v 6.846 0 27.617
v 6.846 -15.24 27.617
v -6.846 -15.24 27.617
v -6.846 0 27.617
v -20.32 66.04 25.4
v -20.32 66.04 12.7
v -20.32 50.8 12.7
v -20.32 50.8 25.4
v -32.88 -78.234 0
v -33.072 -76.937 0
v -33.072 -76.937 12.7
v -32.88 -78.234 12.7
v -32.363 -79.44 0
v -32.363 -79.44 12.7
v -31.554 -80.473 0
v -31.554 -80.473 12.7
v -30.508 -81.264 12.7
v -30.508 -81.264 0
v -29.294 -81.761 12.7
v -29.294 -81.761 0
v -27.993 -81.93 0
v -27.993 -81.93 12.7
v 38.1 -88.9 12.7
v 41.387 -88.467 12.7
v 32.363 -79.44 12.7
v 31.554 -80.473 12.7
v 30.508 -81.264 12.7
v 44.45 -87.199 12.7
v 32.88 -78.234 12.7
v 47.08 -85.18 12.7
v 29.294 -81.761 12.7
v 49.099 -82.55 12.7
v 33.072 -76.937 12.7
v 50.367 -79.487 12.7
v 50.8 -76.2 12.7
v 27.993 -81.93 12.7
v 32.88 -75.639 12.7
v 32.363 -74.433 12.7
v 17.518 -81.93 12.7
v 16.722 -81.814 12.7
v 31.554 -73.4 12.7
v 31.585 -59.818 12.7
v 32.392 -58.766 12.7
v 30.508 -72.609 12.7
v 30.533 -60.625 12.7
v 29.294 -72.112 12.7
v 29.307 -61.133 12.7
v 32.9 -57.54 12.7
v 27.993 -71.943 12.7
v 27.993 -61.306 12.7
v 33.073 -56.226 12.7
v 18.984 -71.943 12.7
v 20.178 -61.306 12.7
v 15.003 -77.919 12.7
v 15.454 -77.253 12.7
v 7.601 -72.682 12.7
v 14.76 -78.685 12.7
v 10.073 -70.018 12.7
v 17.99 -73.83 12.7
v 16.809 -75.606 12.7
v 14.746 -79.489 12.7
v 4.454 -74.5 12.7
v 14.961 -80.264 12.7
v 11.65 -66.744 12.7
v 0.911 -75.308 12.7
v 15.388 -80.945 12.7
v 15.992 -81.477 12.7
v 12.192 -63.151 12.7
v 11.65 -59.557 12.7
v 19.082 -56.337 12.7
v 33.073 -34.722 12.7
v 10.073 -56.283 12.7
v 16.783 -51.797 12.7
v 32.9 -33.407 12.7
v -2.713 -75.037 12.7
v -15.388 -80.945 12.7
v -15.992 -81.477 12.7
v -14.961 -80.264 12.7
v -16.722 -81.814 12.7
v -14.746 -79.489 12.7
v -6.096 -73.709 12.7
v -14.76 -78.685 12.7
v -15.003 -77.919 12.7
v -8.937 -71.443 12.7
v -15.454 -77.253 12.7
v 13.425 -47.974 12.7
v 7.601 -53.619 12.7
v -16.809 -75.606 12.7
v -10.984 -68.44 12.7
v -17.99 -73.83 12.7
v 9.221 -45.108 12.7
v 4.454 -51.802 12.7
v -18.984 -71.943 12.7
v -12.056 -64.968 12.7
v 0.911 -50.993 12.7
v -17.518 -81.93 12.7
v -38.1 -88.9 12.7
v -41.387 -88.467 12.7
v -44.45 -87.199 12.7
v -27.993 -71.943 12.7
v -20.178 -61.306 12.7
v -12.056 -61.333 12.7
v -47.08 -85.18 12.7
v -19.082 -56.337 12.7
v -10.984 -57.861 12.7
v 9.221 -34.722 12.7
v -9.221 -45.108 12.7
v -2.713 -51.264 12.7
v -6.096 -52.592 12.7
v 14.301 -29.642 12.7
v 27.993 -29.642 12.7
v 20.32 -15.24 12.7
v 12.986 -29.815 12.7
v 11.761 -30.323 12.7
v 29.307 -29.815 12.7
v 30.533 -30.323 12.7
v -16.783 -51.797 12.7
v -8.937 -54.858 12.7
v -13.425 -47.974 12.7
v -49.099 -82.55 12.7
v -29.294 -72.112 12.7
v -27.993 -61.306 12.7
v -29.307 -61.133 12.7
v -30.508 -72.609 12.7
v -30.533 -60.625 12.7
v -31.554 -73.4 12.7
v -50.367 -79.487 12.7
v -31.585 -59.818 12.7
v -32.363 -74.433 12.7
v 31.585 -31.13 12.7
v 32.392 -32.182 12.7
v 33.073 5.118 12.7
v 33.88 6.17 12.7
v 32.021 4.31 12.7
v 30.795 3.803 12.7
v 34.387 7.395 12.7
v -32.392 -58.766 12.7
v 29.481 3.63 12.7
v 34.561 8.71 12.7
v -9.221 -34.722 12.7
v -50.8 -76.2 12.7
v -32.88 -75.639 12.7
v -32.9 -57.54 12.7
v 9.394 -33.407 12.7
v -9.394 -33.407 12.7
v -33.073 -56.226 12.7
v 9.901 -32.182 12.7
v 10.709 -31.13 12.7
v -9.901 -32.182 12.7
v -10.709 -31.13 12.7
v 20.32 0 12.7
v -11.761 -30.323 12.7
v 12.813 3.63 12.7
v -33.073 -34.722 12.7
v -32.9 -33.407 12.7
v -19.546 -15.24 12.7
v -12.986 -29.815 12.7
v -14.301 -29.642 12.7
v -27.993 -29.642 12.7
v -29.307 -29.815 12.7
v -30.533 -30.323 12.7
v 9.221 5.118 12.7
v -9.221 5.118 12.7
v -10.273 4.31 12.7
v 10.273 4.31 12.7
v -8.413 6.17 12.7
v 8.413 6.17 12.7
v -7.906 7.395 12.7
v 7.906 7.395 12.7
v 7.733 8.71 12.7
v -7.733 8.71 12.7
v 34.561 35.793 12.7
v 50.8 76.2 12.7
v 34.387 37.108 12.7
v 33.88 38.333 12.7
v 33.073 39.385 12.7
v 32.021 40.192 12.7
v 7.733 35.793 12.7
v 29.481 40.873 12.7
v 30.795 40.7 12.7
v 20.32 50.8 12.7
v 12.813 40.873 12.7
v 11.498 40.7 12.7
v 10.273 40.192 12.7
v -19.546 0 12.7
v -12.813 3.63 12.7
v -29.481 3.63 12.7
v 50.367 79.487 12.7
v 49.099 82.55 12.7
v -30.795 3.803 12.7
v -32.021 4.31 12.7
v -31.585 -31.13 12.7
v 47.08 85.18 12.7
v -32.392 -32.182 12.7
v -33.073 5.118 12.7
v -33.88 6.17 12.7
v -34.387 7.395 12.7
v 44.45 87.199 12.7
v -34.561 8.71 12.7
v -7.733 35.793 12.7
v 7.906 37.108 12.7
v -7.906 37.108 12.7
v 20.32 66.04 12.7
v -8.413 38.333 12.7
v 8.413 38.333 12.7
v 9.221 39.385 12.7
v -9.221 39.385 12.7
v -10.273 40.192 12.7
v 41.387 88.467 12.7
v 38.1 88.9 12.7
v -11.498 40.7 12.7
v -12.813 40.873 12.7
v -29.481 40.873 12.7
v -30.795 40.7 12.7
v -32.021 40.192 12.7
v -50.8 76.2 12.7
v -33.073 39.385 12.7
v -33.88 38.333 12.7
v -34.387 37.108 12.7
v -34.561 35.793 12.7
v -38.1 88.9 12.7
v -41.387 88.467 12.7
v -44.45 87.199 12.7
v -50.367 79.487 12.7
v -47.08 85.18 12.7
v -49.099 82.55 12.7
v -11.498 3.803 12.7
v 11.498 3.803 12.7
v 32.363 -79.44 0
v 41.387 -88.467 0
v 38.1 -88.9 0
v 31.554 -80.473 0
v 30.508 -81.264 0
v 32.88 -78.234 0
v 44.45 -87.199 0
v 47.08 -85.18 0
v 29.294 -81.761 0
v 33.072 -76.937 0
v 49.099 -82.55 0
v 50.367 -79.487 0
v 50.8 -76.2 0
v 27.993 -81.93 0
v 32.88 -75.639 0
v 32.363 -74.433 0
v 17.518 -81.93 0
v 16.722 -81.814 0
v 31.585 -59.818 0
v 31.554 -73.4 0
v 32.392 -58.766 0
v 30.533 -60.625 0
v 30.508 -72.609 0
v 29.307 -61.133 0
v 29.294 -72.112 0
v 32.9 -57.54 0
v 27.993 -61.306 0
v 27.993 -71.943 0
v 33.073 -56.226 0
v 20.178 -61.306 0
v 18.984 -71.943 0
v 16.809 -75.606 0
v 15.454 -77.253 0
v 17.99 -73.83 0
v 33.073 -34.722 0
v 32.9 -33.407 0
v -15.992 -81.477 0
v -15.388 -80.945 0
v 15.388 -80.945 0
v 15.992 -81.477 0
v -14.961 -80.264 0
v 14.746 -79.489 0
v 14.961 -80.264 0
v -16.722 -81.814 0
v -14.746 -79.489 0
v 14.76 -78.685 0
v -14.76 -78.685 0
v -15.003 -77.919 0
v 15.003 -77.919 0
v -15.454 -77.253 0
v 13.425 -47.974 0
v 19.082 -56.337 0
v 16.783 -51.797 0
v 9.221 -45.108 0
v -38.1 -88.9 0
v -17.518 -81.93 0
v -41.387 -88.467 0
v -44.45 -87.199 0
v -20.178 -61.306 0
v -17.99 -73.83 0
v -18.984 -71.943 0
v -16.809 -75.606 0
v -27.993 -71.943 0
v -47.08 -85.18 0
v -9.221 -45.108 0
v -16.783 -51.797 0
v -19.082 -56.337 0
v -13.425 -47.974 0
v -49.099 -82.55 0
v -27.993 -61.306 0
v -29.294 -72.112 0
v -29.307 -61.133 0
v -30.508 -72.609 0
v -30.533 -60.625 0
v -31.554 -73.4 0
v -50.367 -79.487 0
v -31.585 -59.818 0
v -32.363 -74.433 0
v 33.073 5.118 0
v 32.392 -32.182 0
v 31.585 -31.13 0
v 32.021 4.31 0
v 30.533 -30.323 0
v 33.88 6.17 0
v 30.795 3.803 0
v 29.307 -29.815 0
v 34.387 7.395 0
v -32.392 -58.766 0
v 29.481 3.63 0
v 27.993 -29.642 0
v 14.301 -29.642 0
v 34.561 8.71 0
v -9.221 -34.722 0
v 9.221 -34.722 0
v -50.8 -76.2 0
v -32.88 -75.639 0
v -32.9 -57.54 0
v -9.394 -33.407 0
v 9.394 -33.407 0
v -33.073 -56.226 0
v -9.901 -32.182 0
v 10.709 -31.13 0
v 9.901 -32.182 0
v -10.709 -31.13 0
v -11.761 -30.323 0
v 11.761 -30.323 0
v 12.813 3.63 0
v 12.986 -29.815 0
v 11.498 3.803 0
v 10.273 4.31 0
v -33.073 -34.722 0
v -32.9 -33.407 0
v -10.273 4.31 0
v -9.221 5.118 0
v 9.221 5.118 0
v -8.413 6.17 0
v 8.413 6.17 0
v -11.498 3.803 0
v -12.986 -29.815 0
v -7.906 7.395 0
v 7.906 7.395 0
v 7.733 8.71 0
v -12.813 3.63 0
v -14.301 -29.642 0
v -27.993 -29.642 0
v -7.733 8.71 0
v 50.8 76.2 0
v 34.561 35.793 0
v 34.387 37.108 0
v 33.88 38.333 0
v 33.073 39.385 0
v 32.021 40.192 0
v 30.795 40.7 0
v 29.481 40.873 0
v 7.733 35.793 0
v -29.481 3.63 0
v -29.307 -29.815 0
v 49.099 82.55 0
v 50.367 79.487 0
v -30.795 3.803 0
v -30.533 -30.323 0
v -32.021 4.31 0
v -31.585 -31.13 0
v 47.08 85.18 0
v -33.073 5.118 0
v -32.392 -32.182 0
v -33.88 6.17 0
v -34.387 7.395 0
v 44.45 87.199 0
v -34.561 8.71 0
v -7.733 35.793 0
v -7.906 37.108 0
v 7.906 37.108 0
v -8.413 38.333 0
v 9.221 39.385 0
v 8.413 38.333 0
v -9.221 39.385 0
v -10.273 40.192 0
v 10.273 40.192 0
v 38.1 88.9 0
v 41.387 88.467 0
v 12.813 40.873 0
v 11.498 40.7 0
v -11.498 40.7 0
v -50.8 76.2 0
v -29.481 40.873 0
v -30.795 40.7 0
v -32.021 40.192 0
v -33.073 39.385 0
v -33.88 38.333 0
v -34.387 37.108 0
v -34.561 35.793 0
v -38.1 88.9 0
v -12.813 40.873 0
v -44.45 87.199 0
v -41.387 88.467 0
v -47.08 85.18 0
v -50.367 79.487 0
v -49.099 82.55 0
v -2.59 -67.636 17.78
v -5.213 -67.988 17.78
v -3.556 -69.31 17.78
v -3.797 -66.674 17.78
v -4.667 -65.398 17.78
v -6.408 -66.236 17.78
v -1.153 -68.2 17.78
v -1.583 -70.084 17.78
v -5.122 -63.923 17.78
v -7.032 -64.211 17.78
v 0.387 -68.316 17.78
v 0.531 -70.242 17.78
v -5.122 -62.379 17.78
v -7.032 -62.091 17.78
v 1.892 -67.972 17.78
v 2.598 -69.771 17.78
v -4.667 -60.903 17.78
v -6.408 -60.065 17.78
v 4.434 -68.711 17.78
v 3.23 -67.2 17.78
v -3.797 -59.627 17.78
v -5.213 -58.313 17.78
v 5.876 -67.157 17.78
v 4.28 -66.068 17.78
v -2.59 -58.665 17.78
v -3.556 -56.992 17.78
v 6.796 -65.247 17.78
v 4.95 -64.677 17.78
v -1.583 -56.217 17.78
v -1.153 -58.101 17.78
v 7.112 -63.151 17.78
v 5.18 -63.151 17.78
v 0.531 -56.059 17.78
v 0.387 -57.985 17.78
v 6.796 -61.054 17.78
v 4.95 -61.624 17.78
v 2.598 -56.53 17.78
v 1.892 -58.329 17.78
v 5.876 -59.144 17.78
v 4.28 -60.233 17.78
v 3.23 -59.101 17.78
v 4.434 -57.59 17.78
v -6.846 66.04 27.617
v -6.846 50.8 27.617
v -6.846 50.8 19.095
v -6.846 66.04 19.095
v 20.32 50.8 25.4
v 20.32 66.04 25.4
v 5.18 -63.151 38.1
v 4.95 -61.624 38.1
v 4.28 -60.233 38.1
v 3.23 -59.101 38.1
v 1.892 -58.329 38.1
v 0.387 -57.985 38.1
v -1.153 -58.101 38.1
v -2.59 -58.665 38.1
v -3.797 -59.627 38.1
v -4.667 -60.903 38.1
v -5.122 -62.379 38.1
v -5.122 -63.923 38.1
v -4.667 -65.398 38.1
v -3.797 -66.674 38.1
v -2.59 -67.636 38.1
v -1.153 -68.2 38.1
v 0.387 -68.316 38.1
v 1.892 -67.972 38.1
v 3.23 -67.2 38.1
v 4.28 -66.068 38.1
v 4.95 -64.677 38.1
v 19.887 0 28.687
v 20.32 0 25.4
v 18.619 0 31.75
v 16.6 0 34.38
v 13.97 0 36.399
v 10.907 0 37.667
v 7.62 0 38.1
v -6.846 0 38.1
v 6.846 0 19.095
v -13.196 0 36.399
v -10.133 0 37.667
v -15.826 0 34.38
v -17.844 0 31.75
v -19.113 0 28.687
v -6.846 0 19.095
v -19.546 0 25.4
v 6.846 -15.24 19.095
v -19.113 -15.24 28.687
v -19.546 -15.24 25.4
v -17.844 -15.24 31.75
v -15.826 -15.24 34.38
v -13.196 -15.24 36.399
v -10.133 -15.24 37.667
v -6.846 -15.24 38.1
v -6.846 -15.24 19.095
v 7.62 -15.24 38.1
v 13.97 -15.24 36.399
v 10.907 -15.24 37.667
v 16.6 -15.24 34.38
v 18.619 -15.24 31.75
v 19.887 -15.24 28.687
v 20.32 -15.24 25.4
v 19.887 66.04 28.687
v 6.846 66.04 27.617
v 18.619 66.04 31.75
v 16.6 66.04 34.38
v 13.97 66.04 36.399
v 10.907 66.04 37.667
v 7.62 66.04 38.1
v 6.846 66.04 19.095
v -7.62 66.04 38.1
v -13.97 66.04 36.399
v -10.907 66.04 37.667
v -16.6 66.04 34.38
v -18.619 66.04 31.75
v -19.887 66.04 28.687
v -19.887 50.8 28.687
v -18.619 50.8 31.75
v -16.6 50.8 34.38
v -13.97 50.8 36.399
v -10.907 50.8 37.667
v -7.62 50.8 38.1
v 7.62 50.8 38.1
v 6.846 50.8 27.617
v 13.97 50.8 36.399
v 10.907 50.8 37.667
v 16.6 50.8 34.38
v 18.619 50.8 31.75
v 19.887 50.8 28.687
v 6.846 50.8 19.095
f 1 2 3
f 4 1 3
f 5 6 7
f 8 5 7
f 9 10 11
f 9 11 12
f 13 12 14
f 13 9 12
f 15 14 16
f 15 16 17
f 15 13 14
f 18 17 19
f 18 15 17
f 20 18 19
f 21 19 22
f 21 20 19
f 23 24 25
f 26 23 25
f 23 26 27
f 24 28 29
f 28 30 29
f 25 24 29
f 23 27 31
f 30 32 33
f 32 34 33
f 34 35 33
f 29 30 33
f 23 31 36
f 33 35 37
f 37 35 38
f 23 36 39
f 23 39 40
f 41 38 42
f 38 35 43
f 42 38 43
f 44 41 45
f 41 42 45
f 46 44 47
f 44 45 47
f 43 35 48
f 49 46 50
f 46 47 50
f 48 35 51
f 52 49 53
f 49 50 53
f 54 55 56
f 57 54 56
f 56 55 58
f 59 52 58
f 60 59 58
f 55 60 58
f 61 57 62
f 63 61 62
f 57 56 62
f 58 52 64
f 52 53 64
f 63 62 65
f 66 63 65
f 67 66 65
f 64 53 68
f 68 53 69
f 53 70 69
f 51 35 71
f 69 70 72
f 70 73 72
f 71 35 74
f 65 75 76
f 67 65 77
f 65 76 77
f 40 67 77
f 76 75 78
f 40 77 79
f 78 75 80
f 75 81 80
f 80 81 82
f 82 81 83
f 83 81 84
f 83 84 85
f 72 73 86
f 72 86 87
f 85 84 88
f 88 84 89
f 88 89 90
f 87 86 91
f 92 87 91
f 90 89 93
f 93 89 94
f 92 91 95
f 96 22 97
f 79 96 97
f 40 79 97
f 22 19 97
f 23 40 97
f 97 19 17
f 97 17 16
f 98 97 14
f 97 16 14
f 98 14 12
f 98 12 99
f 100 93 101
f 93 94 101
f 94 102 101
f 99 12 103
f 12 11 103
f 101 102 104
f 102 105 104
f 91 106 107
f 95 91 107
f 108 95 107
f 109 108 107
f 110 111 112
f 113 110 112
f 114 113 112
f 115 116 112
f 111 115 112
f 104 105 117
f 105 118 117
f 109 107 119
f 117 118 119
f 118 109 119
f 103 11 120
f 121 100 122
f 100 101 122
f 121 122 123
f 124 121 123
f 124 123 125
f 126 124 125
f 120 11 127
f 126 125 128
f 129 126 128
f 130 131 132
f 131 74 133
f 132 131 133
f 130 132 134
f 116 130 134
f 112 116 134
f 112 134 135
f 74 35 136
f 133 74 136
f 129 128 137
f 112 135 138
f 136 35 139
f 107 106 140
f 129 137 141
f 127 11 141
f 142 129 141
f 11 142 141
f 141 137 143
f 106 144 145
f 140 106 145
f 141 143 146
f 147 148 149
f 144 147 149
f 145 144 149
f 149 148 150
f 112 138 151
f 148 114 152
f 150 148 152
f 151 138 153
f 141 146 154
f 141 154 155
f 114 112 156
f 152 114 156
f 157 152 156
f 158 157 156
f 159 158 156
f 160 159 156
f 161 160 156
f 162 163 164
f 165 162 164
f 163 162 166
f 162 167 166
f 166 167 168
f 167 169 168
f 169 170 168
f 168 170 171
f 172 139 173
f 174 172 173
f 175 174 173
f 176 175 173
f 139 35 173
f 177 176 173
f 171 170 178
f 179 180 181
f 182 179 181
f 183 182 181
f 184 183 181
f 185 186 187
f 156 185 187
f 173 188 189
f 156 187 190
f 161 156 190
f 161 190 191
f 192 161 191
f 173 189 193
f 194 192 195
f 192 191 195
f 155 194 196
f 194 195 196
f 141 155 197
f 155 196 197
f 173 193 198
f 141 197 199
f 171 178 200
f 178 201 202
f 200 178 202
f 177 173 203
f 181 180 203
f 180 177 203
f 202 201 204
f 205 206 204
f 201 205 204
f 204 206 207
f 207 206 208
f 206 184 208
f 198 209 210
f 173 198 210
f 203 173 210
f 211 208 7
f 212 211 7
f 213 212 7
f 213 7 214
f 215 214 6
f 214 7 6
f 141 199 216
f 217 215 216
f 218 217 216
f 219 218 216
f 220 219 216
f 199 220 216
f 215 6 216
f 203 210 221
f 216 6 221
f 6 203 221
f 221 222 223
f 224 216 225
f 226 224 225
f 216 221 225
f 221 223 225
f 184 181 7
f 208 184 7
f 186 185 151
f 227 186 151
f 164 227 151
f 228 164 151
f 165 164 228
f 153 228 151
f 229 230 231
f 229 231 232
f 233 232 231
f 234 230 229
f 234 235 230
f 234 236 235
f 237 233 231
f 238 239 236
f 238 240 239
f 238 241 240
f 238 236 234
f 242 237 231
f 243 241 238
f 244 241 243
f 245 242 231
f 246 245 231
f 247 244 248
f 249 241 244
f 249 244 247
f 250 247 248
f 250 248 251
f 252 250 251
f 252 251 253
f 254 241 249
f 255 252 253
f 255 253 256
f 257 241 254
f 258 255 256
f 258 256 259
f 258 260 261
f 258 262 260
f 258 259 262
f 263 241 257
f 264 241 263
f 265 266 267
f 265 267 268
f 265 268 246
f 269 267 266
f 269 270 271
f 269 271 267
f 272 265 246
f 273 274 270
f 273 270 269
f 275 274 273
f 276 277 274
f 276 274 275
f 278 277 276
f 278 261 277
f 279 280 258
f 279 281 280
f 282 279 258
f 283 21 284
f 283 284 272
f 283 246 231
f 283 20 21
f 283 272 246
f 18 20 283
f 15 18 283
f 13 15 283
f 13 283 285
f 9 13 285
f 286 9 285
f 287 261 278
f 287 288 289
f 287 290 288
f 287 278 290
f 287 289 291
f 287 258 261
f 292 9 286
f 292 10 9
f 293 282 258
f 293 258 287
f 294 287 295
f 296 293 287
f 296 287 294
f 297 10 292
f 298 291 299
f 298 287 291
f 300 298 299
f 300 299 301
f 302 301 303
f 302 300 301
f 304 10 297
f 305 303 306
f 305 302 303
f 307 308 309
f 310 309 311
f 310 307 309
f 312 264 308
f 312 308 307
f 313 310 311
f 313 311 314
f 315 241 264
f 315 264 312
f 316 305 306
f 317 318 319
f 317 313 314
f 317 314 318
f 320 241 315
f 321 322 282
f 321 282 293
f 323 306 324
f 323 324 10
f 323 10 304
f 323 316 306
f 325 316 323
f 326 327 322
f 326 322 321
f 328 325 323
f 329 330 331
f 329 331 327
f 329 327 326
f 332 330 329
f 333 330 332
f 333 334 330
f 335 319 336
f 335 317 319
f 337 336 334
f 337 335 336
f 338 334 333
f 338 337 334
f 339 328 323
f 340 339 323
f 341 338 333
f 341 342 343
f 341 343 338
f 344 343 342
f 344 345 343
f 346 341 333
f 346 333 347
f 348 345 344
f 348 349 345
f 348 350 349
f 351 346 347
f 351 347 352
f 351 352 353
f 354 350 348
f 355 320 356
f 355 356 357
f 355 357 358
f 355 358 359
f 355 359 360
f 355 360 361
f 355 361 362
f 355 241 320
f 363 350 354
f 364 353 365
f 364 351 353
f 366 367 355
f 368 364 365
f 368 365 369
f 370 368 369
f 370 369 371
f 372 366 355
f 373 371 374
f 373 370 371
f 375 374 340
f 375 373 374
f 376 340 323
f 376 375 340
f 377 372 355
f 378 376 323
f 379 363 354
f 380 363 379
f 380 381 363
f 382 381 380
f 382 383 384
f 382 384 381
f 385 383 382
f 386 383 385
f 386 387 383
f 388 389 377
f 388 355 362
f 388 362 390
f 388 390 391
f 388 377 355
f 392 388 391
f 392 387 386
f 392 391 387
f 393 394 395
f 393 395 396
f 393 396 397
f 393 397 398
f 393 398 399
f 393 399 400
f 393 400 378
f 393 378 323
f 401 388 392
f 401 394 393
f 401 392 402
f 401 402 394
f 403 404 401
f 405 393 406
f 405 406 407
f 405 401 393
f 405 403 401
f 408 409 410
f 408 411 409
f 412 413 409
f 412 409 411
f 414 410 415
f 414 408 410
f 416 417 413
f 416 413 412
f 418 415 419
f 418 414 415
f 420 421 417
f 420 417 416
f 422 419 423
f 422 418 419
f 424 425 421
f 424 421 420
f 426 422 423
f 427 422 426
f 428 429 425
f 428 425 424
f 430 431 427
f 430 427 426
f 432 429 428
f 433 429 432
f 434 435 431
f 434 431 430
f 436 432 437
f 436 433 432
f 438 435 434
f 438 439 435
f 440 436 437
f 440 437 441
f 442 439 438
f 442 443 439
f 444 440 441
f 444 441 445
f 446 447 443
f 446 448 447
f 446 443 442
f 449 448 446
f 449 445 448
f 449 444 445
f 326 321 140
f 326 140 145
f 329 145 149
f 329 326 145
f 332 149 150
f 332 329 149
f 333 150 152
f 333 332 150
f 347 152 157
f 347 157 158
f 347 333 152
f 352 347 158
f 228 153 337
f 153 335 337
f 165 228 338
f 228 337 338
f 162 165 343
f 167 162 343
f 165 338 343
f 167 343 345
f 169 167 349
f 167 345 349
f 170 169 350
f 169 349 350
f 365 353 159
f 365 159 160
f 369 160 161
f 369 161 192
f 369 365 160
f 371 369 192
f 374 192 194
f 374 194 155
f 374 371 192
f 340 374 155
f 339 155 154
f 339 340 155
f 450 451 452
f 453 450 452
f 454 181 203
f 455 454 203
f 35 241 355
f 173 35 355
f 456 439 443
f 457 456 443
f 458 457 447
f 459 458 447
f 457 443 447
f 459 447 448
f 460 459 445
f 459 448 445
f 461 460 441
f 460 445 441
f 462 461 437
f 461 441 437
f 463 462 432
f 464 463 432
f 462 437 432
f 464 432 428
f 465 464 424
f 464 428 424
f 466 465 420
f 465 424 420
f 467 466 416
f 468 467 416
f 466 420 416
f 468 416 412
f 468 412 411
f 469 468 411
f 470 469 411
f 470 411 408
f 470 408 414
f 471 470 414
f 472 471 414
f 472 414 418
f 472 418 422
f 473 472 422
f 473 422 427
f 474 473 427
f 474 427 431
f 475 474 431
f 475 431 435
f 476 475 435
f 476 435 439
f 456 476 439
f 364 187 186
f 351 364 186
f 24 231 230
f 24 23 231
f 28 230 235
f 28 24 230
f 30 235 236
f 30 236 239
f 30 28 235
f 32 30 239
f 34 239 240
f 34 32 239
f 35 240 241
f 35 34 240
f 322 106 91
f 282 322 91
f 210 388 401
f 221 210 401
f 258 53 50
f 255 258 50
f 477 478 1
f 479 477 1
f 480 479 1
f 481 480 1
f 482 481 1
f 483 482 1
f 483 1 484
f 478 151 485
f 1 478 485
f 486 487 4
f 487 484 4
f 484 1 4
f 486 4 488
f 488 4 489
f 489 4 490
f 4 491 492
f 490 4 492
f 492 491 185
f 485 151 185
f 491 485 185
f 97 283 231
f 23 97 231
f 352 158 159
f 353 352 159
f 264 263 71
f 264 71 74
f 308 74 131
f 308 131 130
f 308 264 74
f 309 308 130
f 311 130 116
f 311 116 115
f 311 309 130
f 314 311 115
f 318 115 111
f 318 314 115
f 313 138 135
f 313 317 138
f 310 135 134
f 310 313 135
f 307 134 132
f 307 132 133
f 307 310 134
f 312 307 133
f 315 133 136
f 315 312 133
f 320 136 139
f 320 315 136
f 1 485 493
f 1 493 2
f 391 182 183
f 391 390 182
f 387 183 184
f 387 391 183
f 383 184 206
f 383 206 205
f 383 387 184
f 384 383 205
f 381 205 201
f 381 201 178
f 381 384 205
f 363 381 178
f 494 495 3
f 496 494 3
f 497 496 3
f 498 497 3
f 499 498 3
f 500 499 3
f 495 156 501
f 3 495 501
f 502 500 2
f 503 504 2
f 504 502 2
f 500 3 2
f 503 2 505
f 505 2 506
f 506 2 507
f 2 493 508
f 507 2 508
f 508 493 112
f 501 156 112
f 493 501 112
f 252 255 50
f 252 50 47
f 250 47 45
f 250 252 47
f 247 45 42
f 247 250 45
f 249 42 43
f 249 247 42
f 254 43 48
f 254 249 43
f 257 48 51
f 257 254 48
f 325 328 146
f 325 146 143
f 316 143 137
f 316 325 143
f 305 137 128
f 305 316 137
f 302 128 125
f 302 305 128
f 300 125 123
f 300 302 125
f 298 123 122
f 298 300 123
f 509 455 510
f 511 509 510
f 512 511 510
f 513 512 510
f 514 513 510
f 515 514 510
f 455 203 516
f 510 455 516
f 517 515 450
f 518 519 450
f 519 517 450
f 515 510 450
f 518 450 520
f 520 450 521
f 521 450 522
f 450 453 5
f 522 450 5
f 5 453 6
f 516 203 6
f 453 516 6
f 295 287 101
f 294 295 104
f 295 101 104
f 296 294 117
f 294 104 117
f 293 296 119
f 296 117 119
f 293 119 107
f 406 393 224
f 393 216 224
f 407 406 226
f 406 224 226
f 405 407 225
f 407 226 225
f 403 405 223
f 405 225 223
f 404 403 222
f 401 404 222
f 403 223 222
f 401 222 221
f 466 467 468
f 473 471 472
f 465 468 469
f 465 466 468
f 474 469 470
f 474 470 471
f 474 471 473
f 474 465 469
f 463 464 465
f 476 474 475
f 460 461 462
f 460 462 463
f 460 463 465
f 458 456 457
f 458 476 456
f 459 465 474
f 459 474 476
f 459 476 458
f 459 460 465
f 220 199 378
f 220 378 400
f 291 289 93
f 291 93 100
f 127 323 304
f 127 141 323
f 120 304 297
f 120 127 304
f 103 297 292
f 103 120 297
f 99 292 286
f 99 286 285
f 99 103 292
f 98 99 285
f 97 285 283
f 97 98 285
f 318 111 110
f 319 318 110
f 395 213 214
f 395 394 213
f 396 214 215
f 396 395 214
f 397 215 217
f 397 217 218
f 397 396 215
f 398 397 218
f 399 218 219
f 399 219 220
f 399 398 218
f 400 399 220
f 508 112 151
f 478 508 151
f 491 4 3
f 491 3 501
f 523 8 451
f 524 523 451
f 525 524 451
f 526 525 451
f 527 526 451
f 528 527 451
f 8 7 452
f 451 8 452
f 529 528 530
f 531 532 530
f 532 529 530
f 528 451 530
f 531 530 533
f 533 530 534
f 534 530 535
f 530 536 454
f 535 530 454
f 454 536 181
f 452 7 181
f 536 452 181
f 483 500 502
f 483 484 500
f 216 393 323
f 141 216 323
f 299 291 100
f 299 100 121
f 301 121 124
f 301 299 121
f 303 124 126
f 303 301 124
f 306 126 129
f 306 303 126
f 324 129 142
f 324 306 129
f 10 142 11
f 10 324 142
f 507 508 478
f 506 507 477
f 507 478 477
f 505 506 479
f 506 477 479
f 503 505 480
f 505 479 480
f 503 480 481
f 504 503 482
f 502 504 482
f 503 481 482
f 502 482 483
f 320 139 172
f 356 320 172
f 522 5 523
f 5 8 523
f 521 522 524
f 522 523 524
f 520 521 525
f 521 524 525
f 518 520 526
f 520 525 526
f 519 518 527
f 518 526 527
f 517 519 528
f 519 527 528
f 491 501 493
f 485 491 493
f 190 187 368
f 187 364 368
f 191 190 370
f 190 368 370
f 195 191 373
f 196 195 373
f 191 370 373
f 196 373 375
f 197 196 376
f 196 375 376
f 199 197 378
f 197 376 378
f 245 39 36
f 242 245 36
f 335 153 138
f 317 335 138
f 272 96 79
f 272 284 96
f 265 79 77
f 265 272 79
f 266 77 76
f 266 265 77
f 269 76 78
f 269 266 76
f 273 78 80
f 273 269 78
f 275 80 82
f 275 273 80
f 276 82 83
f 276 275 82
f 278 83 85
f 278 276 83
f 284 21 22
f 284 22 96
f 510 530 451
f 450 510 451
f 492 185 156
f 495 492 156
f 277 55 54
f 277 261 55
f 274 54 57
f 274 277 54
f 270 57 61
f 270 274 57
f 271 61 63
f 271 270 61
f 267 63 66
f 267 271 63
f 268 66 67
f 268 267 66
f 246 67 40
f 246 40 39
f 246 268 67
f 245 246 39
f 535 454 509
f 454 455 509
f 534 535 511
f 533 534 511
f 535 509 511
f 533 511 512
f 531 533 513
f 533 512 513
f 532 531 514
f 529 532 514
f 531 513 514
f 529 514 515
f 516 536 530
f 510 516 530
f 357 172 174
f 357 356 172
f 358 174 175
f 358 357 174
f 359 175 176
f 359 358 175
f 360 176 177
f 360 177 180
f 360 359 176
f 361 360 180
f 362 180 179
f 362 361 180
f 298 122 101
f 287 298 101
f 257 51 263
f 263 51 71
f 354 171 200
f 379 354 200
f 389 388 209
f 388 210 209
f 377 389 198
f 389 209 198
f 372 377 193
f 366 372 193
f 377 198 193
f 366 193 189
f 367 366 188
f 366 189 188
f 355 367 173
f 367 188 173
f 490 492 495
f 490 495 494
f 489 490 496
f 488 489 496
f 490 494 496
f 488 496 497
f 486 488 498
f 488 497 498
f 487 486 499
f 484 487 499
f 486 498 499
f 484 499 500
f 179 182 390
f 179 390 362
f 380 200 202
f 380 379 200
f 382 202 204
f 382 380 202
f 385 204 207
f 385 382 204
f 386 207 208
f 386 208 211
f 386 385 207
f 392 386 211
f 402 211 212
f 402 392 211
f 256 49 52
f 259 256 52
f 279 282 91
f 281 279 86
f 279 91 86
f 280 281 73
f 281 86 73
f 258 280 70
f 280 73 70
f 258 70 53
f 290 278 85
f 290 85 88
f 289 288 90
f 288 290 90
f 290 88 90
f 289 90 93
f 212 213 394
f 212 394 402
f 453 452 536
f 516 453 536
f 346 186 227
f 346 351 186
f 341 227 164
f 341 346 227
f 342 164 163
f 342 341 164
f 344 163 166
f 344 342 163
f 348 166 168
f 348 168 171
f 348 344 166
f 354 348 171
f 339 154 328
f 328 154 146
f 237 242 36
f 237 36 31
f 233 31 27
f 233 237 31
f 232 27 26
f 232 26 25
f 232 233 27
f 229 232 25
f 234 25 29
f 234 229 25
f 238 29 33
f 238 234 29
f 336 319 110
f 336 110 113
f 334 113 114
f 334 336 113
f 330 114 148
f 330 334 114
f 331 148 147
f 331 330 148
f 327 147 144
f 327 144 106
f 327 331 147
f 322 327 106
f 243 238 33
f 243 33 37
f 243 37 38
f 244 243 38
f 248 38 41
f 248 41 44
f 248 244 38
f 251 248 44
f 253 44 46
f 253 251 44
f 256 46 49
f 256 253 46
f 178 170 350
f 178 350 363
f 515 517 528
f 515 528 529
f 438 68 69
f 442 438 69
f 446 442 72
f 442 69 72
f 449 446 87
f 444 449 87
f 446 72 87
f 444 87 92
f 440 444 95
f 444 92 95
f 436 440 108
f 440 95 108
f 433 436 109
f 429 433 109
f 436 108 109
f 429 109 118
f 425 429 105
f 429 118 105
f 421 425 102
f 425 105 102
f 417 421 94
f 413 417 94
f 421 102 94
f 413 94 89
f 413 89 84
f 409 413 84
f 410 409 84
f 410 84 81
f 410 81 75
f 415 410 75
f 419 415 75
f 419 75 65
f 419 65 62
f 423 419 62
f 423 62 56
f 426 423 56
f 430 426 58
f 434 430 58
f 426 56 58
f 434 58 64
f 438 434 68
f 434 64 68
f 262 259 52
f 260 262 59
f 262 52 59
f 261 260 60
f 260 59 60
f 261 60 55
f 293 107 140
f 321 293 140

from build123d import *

# Parameters (mm, degrees)
F1_DEPTH     = 12.7
F3_DEPTH     = 25.4
F4_R         = 12.7
F5_R         = 12.7
F6_R         = 12.7
F8_DEPTH     = 104.141
F9_W         = 26.8278098665
F9_H         = 37.2433126904
F10_DEPTH    = 12.701
F11_R        = 5.08
F12_R        = 12.1917967362
F12_R_2      = 5.1797647995
F13_DEPTH    = 5.08
F14_DEPTH    = 25.4
F15_SIZE     = 5.07999
F17_DEPTH    = 25.4
F18_R        = 5.08
F19_DEPTH    = 12.701
F21_DEPTH    = 12.701
F22_T1_DEPTH = 12.7
F23_R        = 2.794


# Not quite as in the source:
# - a fillet or chamfer that OpenCascade refuses, or shapes differently, is made with other operations: its cross-section is extruded or revolved along the edge and cut away or added
# - a fillet or chamfer is up to 0.001 mm smaller than in the source, because OpenCascade refuses the exact size
# - a feature names something its author has since deleted; it is built from what else it names


with BuildPart() as f1:
    # F0 (on Top) → F1 (new body)
    with BuildSketch(Plane.XY):
        Polygon((-50.8, 88.9), (-50.8, 0), (-50.8, -88.9), (0, -88.9), (50.8, -88.9), (50.8, 0), (50.8, 88.9), (0, 88.9), align=None)
    extrude(amount=F1_DEPTH)

    # F2 (on face) → F3 (join)
    with BuildSketch(Plane.XY.offset(12.7)):
        Polygon((20.32, 66.04), (0, 66.04), (-20.32, 66.04), (-20.32, 50.8), (0, 50.8), (20.32, 50.8), align=None)
        Polygon((0, 0), (-19.5459036618, 0), (-19.5459036618, -15.24), (0, -15.24), (20.32, -15.24), (20.32, 0), align=None)
    extrude(amount=F3_DEPTH)

    # F4
    f4_edges = [f1.edges().sort_by_distance(p)[0] for p in [
        (20.32, -7.62, 38.1),
        (-19.545904, -7.62, 38.1),
    ]]
    fillet(f4_edges, radius=F4_R)

    # F5
    f5_edges = [f1.edges().sort_by_distance(p)[0] for p in [
        (20.32, 58.42, 38.1),
        (-20.32, 58.42, 38.1),
    ]]
    fillet(f5_edges, radius=F5_R)

    # F6
    f6_edges = [f1.edges().sort_by_distance(p)[0] for p in [
        (50.8, 88.9, 6.35),
        (-50.8, 88.9, 6.35),
        (50.8, -88.9, 6.35),
        (-50.8, -88.9, 6.35),
    ]]
    fillet(f6_edges, radius=F6_R)

    # F7 (on face) → F8 (cut, through all)
    with BuildSketch(Plane.XZ.offset(15.24)):
        Polygon((6.8459036618, 27.6168659329), (0, 27.6168659329), (-6.8459036618, 27.6168659329), (-6.8459036618, 19.0950892866), (0, 19.0950892866), (6.8459036618, 19.0950892866), align=None)
    extrude(amount=-F8_DEPTH, mode=Mode.SUBTRACT)

    # F9 (on face) → F10 (cut, through all)
    with BuildSketch(Plane.XY.offset(12.7)):
        with Locations((-21.1466264445, 22.2513012122)):
            Rectangle(F9_W, F9_H)
        with Locations((21.1466264445, 22.2513012122)):
            Rectangle(F9_W, F9_H)
    extrude(amount=-F10_DEPTH, mode=Mode.SUBTRACT)

    # F11
    f11_edges = [f1.edges().sort_by_distance(p)[0] for p in [
        (-34.560531, 40.872958, 6.35),
        (-7.732722, 40.872958, 6.35),
        (-7.732722, 3.629645, 6.35),
        (-34.560531, 3.629645, 6.35),
        (34.560531, 3.629645, 6.35),
        (7.732722, 3.629645, 6.35),
        (7.732722, 40.872958, 6.35),
        (34.560531, 40.872958, 6.35),
    ]]
    fillet(f11_edges, radius=F11_R)

    # F12 (on face) → F13 (join)
    with BuildSketch(Plane.XY.offset(12.7)):
        with Locations((0, -63.150562346)):
            Circle(F12_R)
        with Locations((0, -63.150562346)):
            Circle(F12_R_2, mode=Mode.SUBTRACT)
    extrude(amount=F13_DEPTH)

    # F14 (add): a face of the model
    f14_faces = [f1.faces().sort_by_distance(p)[0] for p in [
        (0, -63.150562346, 12.7),
    ]]
    extrude(f14_faces, amount=F14_DEPTH)

    # F15 (size 5.08 in the source; OpenCascade refuses exactly that, so slightly less here)
    f15_edges = [f1.edges().sort_by_distance(p)[0] for p in [
        (-12.191797, -63.150562, 17.78),
    ]]
    chamfer(f15_edges, length=F15_SIZE)

    # F16 (on face) → F17 (cut)
    with BuildSketch(Plane.XY.offset(12.7)):
        with BuildLine():
            Line((-9.2206190628, -29.6420995146), (-33.0726338262, -29.6420995146))
            Line((-33.0726338262, -29.6420995146), (-33.0726338262, -61.3056821097))
            Line((-33.0726338262, -61.3056821097), (-20.1783736468, -61.3056821097))
            ThreePointArc((-20.1783736468, -61.3056821097), (-16.7830306246, -51.7971386698), (-9.2206190628, -45.1075434685))
            Line((-9.2206190628, -45.1075434685), (-9.2206190628, -29.6420995146))
        make_face()
        with BuildLine():
            Line((33.0726338262, -29.6420995146), (9.2206190628, -29.6420995146))
            Line((9.2206190628, -29.6420995146), (9.2206190628, -45.1075434685))
            ThreePointArc((9.2206190628, -45.1075434685), (16.7830306246, -51.7971386698), (20.1783736468, -61.3056821097))
            Line((20.1783736468, -61.3056821097), (33.0726338262, -61.3056821097))
            Line((33.0726338262, -61.3056821097), (33.0726338262, -29.6420995146))
        make_face()
    extrude(amount=-F17_DEPTH, mode=Mode.SUBTRACT)

    # F18
    f18_edges = [f1.edges().sort_by_distance(p)[0] for p in [
        (-9.220619, -29.6421, 6.35),
        (-33.072634, -29.6421, 6.35),
        (-33.072634, -61.305682, 6.35),
        (33.072634, -61.305682, 6.35),
        (33.072634, -29.6421, 6.35),
        (9.220619, -29.6421, 6.35),
    ]]
    fillet(f18_edges, radius=F18_R)

    # F16 (on face) → F19 (cut, through all)
    with BuildSketch(Plane.XY.offset(12.7)):
        with BuildLine():
            Line((-9.2206190628, -29.6420995146), (-33.0726338262, -29.6420995146))
            Line((-33.0726338262, -29.6420995146), (-33.0726338262, -61.3056821097))
            Line((-33.0726338262, -61.3056821097), (-20.1783736468, -61.3056821097))
            ThreePointArc((-20.1783736468, -61.3056821097), (-16.7830306246, -51.7971386698), (-9.2206190628, -45.1075434685))
            Line((-9.2206190628, -45.1075434685), (-9.2206190628, -29.6420995146))
        make_face()
        with BuildLine():
            Line((33.0726338262, -29.6420995146), (9.2206190628, -29.6420995146))
            Line((9.2206190628, -29.6420995146), (9.2206190628, -45.1075434685))
            ThreePointArc((9.2206190628, -45.1075434685), (16.7830306246, -51.7971386698), (20.1783736468, -61.3056821097))
            Line((20.1783736468, -61.3056821097), (33.0726338262, -61.3056821097))
            Line((33.0726338262, -61.3056821097), (33.0726338262, -29.6420995146))
        make_face()
    extrude(amount=-F19_DEPTH, mode=Mode.SUBTRACT)

    # F20 (on face) → F21 (cut, through all)
    with BuildSketch(Plane.XY.offset(12.7)):
        with BuildLine():
            Line((-33.0726338262, -81.930026412), (-9.2206190628, -81.930026412))
            ThreePointArc((-9.2206190628, -81.930026412), (-14.9601496341, -77.7752677938), (-18.9837029569, -71.9430084535))
            Line((-18.9837029569, -71.9430084535), (-33.0726338262, -71.9430084535))
            Line((-33.0726338262, -71.9430084535), (-33.0726338262, -81.930026412))
        make_face()
        with BuildLine():
            ThreePointArc((18.9837029569, -71.9430084535), (14.9601496341, -77.7752677938), (9.2206190628, -81.930026412))
            Line((9.2206190628, -81.930026412), (33.0726338262, -81.930026412))
            Line((33.0726338262, -81.930026412), (33.0726338262, -71.9430084535))
            Line((33.0726338262, -71.9430084535), (18.9837029569, -71.9430084535))
        make_face()
    extrude(amount=-F21_DEPTH, mode=Mode.SUBTRACT)

    # F22: fillet of radius 5.08 on 10 edges, made by hand

    # F22_s2 → F22_t1 (join)
    with BuildSketch(Plane.XY):
        with BuildLine():
            ThreePointArc((-9.2206190628, -34.7220995146), (-10.7085166144, -31.1299970662), (-14.3006190628, -29.6420995146))
            Line((-14.3006190628, -29.6420995146), (-9.2206190628, -29.6420995146))
            Line((-9.2206190628, -29.6420995146), (-9.2206190628, -34.7220995146))
        make_face()
        with BuildLine():
            ThreePointArc((-27.9926338262, -29.6420995146), (-31.5847362746, -31.1299970662), (-33.0726338262, -34.7220995146))
            Line((-33.0726338262, -34.7220995146), (-33.0726338262, -29.6420995146))
            Line((-33.0726338262, -29.6420995146), (-27.9926338262, -29.6420995146))
        make_face()
        with BuildLine():
            ThreePointArc((-33.0726338262, -56.2256821097), (-31.5847362746, -59.8177845582), (-27.9926338262, -61.3056821097))
            Line((-27.9926338262, -61.3056821097), (-33.0726338262, -61.3056821097))
            Line((-33.0726338262, -61.3056821097), (-33.0726338262, -56.2256821097))
        make_face()
        with BuildLine():
            ThreePointArc((33.0726338262, -34.7220995146), (31.5847362746, -31.1299970662), (27.9926338262, -29.6420995146))
            Line((27.9926338262, -29.6420995146), (33.0726338262, -29.6420995146))
            Line((33.0726338262, -29.6420995146), (33.0726338262, -34.7220995146))
        make_face()
        with BuildLine():
            ThreePointArc((14.3006190628, -29.6420995146), (10.7085166144, -31.1299970662), (9.2206190628, -34.7220995146))
            Line((9.2206190628, -34.7220995146), (9.2206190628, -29.6420995146))
            Line((9.2206190628, -29.6420995146), (14.3006190628, -29.6420995146))
        make_face()
        with BuildLine():
            ThreePointArc((27.9926338262, -61.3056821097), (31.5847362746, -59.8177845582), (33.0726338262, -56.2256821097))
            Line((33.0726338262, -56.2256821097), (33.0726338262, -61.3056821097))
            Line((33.0726338262, -61.3056821097), (27.9926338262, -61.3056821097))
        make_face()
        with BuildLine():
            ThreePointArc((-33.0726338262, -76.850026412), (-31.5847362746, -80.4421288604), (-27.9926338262, -81.930026412))
            Line((-27.9926338262, -81.930026412), (-33.0726338262, -81.930026412))
            Line((-33.0726338262, -81.930026412), (-33.0726338262, -76.850026412))
        make_face()
        with BuildLine():
            ThreePointArc((-27.9926338262, -71.9430084535), (-31.5847362746, -73.4309060051), (-33.0726338262, -77.0230084535))
            Line((-33.0726338262, -77.0230084535), (-33.0726338262, -71.9430084535))
            Line((-33.0726338262, -71.9430084535), (-27.9926338262, -71.9430084535))
        make_face()
        with BuildLine():
            ThreePointArc((33.0726338262, -77.0230084535), (31.5847362746, -73.4309060051), (27.9926338262, -71.9430084535))
            Line((27.9926338262, -71.9430084535), (33.0726338262, -71.9430084535))
            Line((33.0726338262, -71.9430084535), (33.0726338262, -77.0230084535))
        make_face()
        with BuildLine():
            ThreePointArc((27.9926338262, -81.930026412), (31.5847362746, -80.4421288604), (33.0726338262, -76.850026412))
            Line((33.0726338262, -76.850026412), (33.0726338262, -81.930026412))
            Line((33.0726338262, -81.930026412), (27.9926338262, -81.930026412))
        make_face()
    extrude(amount=F22_T1_DEPTH)

    # F23
    f23_edges = [f1.edges().sort_by_distance(p)[0] for p in [
        (9.220619, -81.930026, 6.35),
        (-9.220619, -81.930026, 6.35),
    ]]
    fillet(f23_edges, radius=F23_R)


solid = f1.part
